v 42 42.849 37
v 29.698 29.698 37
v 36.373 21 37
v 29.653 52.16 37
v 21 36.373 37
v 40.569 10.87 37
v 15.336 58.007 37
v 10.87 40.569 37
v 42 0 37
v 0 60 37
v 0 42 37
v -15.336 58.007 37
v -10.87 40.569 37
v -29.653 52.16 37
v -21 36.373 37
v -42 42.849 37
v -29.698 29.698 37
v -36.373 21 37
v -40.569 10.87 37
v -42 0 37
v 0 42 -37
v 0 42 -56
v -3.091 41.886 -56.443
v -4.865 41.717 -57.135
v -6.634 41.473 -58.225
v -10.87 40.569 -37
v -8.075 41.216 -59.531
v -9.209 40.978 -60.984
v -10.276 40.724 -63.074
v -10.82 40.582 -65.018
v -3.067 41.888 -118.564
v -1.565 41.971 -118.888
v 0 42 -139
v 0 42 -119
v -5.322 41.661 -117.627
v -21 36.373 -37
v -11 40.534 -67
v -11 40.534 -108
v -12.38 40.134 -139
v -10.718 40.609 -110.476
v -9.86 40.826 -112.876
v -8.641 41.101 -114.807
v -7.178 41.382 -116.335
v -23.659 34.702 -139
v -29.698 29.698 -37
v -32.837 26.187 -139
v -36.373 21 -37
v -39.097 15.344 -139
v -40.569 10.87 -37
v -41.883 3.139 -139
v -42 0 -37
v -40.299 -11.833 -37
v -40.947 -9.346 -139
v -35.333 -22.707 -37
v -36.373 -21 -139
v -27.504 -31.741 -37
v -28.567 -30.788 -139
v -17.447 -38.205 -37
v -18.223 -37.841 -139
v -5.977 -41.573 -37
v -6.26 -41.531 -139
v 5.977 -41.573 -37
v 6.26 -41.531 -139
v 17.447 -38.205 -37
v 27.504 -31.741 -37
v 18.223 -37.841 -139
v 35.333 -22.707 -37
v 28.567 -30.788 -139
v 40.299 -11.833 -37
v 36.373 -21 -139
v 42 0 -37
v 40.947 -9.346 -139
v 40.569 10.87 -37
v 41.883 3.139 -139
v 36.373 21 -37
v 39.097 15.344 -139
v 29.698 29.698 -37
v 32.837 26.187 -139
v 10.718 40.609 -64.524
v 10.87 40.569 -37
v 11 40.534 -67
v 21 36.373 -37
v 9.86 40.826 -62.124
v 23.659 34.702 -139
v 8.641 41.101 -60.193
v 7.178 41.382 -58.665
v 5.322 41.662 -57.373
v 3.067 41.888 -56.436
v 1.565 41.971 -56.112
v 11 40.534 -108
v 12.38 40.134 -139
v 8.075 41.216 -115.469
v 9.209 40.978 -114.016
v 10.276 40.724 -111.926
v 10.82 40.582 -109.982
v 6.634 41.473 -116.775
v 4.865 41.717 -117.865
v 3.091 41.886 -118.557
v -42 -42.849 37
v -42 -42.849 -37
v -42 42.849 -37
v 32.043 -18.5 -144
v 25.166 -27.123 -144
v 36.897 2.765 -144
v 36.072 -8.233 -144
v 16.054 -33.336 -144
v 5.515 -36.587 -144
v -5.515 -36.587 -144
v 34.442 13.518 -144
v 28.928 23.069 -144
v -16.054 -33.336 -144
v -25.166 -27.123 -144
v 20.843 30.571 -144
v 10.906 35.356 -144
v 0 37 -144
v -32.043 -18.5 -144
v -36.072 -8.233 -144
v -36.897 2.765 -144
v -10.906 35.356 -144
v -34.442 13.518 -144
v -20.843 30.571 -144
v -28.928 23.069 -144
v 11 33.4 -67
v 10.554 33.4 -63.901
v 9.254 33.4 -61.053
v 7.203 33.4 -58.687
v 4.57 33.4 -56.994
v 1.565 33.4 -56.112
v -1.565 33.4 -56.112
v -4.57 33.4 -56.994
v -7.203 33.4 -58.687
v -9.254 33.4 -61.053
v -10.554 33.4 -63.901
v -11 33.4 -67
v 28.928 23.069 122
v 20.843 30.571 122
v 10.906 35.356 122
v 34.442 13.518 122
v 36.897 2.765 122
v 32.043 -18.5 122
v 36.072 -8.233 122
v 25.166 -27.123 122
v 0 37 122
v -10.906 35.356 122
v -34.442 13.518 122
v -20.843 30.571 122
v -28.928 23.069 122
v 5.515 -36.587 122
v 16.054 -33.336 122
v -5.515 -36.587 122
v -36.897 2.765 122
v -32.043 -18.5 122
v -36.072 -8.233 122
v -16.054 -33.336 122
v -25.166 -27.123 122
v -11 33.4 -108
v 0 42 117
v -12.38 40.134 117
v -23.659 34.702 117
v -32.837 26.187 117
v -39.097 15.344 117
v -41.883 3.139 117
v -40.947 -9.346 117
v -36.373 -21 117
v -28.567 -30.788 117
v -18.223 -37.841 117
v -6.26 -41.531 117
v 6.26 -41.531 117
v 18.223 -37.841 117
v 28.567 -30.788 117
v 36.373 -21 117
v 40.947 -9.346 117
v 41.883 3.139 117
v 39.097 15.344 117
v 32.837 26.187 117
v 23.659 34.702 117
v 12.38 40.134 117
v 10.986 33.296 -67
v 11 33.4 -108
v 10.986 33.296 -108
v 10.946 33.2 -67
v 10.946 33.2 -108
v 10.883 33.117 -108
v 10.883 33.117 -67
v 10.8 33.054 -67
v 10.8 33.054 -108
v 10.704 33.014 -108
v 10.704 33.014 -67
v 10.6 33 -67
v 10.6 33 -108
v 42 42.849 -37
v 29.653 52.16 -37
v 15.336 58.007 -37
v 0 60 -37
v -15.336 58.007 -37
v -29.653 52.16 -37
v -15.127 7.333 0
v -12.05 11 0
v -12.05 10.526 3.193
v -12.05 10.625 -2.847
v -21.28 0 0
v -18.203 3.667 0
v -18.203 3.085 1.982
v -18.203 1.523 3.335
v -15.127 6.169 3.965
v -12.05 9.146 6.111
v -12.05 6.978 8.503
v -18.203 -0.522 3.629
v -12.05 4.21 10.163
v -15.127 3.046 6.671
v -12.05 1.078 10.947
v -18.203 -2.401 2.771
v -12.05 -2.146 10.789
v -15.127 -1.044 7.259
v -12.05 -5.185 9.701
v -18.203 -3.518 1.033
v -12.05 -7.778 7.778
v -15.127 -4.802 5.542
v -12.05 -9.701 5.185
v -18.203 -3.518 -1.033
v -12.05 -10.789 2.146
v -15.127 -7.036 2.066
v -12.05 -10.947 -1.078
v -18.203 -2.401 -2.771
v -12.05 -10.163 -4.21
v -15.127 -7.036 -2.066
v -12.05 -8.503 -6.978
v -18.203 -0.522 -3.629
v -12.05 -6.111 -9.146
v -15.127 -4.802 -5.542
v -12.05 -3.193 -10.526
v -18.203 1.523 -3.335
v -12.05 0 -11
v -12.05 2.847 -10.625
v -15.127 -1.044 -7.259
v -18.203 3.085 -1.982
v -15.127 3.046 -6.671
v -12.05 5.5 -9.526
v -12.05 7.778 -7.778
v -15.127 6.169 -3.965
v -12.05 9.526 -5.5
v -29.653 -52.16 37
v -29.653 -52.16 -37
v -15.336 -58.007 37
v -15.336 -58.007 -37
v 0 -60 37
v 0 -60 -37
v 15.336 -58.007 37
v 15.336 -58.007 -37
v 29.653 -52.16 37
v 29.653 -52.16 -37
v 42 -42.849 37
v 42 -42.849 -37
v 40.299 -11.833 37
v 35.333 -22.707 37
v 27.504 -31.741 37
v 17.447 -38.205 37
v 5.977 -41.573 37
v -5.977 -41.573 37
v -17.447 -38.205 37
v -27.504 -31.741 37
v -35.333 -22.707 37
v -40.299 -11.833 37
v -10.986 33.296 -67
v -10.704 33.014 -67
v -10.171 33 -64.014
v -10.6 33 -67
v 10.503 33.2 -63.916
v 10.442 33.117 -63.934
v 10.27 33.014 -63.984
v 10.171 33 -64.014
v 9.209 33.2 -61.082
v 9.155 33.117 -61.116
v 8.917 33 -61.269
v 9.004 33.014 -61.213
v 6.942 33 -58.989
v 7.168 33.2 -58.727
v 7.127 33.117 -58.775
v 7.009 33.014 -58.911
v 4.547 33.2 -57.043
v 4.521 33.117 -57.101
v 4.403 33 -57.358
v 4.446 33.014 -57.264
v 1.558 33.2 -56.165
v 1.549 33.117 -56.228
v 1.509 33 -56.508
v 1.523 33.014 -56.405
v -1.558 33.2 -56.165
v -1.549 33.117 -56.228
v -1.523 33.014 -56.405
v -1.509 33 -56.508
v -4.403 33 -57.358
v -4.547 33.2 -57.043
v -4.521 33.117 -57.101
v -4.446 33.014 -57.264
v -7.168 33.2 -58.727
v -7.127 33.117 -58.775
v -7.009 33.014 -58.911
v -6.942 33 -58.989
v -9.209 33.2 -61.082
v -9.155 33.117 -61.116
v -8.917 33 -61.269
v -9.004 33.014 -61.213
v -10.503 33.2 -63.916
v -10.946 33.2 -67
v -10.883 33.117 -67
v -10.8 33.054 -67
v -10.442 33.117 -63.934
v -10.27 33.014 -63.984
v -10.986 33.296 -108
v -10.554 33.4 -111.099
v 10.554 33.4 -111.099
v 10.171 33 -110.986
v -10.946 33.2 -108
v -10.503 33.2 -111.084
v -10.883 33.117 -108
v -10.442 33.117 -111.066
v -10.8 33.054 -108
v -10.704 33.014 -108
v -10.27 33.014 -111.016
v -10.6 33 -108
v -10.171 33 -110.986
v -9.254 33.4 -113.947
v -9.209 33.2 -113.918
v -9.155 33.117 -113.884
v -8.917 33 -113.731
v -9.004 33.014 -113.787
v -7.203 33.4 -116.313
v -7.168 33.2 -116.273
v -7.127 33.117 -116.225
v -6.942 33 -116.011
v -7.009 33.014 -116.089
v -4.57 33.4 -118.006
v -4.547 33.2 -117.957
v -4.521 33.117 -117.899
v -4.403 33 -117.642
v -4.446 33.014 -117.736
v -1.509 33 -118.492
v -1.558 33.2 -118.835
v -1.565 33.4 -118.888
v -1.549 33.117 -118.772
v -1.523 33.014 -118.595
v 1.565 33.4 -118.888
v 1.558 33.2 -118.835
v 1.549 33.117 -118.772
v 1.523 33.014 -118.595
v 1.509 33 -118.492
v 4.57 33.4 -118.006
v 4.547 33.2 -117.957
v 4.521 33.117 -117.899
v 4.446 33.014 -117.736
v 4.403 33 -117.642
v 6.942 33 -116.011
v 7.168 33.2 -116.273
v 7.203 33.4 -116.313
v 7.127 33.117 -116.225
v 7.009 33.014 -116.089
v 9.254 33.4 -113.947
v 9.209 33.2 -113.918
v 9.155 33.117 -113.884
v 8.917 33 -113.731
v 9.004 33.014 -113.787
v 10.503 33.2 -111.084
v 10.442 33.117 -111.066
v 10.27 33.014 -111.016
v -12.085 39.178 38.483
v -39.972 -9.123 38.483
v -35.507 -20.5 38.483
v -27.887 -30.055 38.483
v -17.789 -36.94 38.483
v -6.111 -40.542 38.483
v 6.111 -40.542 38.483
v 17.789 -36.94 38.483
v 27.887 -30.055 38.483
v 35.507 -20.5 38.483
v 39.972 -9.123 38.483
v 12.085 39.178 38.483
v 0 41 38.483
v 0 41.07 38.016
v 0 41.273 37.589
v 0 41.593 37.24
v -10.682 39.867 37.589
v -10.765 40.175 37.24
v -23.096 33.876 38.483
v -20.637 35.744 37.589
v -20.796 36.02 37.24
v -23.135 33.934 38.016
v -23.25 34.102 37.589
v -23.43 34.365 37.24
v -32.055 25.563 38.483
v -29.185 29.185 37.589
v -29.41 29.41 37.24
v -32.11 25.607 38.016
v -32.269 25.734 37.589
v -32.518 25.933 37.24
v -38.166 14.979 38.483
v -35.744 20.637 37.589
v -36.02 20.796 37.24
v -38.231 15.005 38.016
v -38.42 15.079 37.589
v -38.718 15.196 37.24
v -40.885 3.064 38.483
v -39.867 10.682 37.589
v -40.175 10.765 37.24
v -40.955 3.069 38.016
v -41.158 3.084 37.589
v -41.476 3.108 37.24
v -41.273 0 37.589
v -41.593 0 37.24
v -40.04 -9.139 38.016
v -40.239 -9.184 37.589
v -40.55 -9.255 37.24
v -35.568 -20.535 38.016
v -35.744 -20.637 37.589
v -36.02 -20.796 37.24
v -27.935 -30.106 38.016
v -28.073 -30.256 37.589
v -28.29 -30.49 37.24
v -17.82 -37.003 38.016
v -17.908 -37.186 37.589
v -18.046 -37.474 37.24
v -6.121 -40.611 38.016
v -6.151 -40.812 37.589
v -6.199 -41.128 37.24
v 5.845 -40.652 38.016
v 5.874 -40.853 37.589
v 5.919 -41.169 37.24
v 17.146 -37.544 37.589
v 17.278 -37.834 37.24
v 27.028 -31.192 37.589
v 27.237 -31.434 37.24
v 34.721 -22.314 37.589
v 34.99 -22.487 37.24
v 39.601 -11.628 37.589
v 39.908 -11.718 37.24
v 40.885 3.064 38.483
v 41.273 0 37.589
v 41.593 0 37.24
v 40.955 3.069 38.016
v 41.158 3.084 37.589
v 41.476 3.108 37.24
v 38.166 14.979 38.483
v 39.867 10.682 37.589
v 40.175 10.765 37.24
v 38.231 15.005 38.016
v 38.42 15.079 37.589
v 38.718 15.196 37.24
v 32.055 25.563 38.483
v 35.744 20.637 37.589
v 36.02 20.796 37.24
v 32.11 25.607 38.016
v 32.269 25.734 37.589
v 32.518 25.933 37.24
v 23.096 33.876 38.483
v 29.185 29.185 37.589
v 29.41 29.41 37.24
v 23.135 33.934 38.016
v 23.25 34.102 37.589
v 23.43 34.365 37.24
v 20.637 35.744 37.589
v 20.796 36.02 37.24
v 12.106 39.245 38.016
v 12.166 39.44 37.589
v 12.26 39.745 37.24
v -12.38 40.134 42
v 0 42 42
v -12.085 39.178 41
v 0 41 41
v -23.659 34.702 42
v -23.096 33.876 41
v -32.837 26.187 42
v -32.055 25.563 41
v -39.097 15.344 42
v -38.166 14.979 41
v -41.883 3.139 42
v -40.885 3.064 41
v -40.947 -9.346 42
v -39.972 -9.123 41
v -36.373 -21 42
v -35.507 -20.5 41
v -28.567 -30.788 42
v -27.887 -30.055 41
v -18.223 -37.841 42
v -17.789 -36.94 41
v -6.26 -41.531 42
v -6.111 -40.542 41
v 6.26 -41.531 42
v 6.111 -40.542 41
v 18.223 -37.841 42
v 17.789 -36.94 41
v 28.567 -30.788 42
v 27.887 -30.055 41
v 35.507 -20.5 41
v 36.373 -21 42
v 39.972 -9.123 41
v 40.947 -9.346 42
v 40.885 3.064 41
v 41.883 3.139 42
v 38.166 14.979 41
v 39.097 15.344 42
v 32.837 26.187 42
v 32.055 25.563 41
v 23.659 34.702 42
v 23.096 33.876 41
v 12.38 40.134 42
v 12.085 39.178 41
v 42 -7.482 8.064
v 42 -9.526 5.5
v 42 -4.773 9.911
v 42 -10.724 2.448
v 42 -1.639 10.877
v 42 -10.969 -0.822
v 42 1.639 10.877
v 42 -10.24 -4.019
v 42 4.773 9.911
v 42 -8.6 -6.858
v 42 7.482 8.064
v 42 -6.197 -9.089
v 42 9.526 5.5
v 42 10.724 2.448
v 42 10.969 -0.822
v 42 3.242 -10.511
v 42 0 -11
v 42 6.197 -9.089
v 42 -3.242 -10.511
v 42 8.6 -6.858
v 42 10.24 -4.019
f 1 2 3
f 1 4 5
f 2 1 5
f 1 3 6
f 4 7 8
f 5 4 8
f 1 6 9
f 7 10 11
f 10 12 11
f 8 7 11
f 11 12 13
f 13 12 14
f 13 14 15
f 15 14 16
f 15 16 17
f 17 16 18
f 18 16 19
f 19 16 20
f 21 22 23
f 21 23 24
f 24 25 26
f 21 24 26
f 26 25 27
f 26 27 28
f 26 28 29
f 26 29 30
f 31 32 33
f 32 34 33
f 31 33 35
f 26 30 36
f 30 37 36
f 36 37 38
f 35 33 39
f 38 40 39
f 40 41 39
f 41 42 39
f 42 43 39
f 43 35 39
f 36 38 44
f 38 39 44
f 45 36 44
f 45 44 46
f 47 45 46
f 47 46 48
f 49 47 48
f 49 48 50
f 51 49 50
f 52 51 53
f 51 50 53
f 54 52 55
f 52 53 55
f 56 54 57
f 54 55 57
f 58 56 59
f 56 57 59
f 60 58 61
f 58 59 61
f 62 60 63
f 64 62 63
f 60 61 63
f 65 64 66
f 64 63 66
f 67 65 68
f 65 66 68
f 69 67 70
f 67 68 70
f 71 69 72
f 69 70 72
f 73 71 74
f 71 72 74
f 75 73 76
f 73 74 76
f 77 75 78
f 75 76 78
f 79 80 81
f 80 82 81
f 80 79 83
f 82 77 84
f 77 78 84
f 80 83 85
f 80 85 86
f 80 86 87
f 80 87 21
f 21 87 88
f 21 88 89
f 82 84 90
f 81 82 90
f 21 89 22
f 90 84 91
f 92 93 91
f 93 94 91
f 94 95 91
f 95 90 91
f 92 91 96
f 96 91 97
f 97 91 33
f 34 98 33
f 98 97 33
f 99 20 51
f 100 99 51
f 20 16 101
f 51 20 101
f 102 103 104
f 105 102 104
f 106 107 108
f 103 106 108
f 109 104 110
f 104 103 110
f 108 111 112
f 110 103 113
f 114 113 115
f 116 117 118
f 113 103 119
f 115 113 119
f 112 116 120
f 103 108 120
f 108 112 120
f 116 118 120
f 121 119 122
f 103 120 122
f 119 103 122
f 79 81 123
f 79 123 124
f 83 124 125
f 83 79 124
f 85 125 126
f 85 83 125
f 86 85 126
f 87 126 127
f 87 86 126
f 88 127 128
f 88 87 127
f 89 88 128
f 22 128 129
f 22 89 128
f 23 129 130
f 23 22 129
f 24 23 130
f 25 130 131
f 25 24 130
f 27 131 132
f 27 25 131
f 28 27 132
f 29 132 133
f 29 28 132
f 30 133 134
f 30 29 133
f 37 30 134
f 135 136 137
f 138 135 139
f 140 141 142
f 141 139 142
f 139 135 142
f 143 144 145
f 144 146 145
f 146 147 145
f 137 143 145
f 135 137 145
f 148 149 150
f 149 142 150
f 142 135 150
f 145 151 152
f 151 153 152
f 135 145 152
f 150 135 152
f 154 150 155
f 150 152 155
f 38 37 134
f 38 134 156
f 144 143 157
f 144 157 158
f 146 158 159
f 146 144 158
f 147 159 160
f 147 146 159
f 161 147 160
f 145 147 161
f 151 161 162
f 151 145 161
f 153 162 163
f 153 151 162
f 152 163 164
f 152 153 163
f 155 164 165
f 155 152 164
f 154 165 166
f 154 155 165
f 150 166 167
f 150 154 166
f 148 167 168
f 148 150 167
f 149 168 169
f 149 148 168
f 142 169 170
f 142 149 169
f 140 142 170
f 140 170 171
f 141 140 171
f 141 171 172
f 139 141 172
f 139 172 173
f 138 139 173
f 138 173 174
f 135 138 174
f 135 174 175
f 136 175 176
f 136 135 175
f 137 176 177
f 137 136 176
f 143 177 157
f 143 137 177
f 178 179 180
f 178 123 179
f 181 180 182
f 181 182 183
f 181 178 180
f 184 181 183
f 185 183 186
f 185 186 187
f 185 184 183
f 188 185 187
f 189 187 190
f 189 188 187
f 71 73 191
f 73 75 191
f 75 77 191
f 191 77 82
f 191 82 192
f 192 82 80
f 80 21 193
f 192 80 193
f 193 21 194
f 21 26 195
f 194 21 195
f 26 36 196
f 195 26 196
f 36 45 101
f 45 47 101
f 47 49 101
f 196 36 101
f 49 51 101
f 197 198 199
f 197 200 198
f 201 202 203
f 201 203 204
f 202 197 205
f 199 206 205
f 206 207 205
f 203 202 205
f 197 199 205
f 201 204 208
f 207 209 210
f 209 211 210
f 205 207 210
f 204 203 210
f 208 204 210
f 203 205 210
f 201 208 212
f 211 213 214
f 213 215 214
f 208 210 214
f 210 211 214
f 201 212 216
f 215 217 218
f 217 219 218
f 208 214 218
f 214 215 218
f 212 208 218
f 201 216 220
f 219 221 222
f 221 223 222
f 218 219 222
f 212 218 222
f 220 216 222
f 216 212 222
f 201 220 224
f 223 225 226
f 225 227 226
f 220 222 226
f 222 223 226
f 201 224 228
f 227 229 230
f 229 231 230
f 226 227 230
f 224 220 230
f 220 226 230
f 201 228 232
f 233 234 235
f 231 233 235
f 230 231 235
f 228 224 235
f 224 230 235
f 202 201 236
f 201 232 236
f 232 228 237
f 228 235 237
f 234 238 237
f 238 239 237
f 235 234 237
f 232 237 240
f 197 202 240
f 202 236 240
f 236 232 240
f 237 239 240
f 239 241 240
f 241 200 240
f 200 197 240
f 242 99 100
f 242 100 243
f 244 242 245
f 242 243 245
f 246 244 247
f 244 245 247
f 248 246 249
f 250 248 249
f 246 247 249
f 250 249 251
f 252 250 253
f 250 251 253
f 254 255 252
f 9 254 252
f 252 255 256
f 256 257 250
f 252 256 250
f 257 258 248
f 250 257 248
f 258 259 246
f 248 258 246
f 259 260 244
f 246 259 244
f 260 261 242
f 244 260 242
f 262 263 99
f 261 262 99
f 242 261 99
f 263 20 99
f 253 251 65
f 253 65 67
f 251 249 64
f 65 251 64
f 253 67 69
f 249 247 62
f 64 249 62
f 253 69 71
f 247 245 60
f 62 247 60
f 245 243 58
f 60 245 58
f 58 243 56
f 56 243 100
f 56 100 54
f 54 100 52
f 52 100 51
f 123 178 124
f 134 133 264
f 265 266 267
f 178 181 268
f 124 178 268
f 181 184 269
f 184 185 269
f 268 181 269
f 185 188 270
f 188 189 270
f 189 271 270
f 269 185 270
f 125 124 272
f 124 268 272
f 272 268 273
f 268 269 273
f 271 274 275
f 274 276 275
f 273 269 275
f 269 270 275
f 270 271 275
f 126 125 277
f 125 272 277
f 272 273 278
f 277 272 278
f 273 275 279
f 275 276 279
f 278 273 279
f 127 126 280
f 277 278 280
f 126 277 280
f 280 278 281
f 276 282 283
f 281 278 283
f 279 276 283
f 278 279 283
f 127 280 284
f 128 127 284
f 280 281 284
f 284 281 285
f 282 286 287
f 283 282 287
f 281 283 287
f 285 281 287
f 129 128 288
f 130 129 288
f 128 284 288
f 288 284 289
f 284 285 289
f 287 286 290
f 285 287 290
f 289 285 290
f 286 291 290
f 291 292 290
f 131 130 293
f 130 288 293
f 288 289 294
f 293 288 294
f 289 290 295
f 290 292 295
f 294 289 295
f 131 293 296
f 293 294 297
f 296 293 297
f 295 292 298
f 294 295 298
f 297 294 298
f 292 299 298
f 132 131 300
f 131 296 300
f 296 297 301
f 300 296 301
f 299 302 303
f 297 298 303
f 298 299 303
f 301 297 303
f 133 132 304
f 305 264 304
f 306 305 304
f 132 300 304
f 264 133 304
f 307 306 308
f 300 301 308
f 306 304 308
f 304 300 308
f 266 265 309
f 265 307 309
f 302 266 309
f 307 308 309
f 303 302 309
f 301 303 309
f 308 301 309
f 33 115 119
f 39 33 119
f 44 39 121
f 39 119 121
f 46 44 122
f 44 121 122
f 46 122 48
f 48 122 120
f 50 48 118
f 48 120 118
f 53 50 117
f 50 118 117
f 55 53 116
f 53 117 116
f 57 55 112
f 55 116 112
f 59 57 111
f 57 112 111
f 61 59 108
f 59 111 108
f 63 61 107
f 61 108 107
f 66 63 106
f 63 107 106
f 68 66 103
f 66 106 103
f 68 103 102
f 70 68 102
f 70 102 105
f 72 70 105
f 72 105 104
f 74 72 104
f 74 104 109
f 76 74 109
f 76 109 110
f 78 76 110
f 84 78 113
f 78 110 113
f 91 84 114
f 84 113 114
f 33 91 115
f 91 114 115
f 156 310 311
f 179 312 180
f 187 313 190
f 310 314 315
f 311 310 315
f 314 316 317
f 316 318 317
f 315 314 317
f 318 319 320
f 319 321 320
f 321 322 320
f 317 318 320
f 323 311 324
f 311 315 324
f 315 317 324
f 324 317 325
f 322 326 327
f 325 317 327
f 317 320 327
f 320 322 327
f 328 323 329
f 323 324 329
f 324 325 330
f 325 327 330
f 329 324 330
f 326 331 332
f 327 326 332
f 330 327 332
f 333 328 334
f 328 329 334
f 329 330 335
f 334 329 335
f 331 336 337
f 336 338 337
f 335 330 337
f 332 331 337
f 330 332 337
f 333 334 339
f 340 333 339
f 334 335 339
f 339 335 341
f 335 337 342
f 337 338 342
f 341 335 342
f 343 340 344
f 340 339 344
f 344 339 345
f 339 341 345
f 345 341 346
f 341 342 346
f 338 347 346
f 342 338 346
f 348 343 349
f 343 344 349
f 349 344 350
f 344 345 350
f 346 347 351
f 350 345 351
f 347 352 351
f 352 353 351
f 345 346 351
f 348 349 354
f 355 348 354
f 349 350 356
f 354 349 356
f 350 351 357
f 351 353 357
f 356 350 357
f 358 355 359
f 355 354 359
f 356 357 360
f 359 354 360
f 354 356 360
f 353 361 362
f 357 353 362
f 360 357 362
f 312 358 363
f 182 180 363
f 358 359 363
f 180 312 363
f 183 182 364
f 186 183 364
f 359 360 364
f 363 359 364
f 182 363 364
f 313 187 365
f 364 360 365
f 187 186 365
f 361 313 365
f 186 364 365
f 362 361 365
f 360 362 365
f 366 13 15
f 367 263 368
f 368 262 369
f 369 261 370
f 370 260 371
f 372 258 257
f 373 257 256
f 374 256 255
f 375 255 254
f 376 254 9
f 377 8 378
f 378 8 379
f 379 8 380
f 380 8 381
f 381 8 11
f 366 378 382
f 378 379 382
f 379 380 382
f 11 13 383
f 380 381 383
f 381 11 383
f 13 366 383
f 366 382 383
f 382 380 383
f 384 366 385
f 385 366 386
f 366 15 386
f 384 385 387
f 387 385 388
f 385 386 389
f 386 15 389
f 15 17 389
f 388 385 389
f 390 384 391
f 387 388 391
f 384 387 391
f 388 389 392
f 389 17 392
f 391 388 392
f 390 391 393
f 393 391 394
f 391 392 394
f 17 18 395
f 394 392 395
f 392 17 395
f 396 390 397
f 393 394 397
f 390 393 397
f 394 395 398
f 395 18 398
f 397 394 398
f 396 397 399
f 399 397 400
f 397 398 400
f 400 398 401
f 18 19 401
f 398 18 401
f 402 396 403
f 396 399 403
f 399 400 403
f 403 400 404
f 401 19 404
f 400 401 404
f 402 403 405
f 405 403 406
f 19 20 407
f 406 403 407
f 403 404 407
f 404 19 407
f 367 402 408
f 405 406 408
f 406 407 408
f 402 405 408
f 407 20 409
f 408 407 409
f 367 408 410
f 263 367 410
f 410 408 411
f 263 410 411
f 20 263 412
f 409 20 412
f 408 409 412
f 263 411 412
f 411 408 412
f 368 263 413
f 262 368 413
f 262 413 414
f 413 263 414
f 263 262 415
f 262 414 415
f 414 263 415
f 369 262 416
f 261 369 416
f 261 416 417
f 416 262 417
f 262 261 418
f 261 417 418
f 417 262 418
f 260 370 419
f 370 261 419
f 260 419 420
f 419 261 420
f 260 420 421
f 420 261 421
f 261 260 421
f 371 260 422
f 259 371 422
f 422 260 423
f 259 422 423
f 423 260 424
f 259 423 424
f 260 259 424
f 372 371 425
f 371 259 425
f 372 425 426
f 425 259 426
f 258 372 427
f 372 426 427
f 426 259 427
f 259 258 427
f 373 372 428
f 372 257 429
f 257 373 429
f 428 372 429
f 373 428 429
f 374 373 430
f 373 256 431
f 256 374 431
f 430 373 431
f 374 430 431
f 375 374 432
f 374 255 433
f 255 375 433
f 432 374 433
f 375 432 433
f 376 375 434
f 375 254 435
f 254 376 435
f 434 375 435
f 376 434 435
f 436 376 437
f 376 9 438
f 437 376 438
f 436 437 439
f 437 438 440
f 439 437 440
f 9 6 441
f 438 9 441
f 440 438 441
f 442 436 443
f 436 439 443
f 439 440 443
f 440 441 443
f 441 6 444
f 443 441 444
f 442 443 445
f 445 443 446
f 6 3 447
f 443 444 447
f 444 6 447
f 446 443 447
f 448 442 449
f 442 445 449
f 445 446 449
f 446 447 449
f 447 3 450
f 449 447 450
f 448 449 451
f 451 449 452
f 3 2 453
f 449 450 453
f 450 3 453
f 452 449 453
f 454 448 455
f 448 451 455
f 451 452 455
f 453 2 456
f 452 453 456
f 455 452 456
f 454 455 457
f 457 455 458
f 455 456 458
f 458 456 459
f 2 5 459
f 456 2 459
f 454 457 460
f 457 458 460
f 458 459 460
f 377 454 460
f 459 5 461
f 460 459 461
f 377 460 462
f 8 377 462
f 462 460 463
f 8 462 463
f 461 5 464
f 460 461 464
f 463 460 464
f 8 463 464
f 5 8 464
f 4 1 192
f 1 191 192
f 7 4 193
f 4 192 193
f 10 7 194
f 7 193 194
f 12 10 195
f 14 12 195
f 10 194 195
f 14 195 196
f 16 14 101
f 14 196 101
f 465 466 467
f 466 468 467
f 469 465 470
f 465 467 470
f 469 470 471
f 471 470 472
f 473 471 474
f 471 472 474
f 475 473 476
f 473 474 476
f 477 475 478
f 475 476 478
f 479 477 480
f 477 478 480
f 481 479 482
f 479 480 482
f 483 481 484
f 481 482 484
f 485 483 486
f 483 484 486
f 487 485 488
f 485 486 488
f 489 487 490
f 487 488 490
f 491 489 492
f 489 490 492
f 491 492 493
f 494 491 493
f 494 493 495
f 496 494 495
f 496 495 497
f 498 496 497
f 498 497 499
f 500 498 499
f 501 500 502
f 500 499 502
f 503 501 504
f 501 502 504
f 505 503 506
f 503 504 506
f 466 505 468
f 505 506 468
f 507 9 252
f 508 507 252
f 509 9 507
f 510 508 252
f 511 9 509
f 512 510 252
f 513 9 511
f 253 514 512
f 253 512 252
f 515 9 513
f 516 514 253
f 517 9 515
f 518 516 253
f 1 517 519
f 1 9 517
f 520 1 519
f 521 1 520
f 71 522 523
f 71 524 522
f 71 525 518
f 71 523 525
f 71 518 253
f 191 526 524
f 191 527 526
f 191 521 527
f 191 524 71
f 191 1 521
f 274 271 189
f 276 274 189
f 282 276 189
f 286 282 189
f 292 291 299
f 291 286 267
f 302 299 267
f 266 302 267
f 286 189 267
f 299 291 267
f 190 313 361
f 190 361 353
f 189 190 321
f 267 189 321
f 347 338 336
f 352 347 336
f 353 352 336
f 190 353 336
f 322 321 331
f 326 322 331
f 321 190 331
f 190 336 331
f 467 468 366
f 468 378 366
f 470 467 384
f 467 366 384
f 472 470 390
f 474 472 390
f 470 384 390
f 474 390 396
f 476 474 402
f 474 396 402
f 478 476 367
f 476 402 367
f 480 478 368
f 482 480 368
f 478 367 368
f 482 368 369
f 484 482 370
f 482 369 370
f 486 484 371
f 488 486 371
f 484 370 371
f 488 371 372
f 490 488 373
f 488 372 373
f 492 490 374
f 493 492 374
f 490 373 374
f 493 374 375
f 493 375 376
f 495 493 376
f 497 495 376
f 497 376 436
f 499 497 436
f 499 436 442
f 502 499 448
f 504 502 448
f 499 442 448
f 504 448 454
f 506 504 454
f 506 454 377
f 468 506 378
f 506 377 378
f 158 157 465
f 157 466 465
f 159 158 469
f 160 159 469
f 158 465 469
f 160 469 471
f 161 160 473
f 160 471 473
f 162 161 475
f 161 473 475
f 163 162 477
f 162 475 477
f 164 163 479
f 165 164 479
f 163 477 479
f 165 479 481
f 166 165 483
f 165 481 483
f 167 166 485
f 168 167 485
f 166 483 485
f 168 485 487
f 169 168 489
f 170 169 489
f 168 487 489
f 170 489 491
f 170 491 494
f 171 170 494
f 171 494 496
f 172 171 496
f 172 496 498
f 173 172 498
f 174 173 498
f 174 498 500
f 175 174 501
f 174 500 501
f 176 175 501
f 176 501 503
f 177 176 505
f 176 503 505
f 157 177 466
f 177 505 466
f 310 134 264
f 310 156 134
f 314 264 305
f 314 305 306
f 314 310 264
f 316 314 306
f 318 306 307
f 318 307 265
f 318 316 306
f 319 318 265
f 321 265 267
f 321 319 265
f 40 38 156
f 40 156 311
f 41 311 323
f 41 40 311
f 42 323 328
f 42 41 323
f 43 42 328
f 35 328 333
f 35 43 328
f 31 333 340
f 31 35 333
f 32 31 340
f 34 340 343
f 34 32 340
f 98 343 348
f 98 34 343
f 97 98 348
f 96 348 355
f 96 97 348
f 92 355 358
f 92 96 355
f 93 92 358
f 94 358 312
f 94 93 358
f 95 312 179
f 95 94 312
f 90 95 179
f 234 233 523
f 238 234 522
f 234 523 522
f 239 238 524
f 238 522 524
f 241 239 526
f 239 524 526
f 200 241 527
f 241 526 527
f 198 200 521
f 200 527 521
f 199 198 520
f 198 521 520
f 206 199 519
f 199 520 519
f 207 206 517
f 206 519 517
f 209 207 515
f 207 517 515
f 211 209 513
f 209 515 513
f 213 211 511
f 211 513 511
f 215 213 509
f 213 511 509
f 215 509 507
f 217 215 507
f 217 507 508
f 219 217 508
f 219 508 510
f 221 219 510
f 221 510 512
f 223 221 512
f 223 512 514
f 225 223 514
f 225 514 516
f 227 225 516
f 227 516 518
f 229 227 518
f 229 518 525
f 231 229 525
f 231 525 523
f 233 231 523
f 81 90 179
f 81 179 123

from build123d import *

# Parameters (mm, degrees)
CUT_EXTRUDE_1_DEPTH = 9
FILLET_1_R          = 0.4
CHAMFER_1_SIZE      = 5
CHAMFER_2_SIZE      = 5
SKETCH_5_W          = 18
SKETCH_5_H          = 74
CUT_EXTRUDE_2_DEPTH = 120
SKETCH_6_R          = 11
CUT_EXTRUDE_3_DEPTH = 54.05


with BuildPart() as part:
    # Эскиз1 → Повернуть1 (revolve)
    with BuildSketch(Plane(origin=(0, 0, 0), x_dir=(0, 0, -1), z_dir=(1, 0, 0))):
        Polygon((144, 0), (-122, 0), (-122, 42), (-37, 42), (-37, 60), (37, 60), (37, 42), (144, 42), align=None)
    revolve(axis=Axis((0, 0, 0), (0, 0, 1)))

    # Эскиз2 → Вырез-Вытянуть1 (cut)
    with BuildSketch(Plane(origin=(0, 42, 0), x_dir=(1, 0, 0), z_dir=(0, 1, 0))):
        with BuildLine():
            Line((-11, 67), (-11, 108))
            ThreePointArc((-11, 108), (0, 119), (11, 108))
            Line((11, 108), (11, 67))
            ThreePointArc((11, 67), (0, 56), (-11, 67))
        make_face()
    extrude(amount=-CUT_EXTRUDE_1_DEPTH, mode=Mode.SUBTRACT)

    # Скругление1
    fillet_1_edges = [part.edges().sort_by_distance(p)[0] for p in [
        (0, 33, -56),
        (-11, 33, -87.5),
        (0, 33, -119),
        (11, 33, -87.5),
    ]]
    fillet(fillet_1_edges, radius=FILLET_1_R)

    # Фаска1
    chamfer_1_edges = [part.edges().sort_by_distance(p)[0] for p in [
        (0, -42, -144),
    ]]
    chamfer(chamfer_1_edges, length=CHAMFER_1_SIZE)

    # Фаска2
    chamfer_2_edges = [part.edges().sort_by_distance(p)[0] for p in [
        (0, -42, 122),
    ]]
    chamfer(chamfer_2_edges, length=CHAMFER_2_SIZE)

    # Эскиз3 → Вырез-Повернуть1 (revolve, cut)
    with BuildSketch(Plane(origin=(0, 0, 0), x_dir=(0, 0, -1), z_dir=(1, 0, 0))):
        with BuildLine():
            Line((-37, 42), (-42, 42))
            Line((-42, 42), (-41, 41))
            Line((-41, 41), (-38.483239697, 41))
            ThreePointArc((-38.483239697, 41), (-37.588812506, 41.273350084), (-37, 42))
        make_face()
    revolve(axis=Axis((0, 0, 0), (0, 0, 1)), mode=Mode.SUBTRACT)

    # Эскиз5 → Вырез-Вытянуть2 (cut)
    with BuildSketch(Plane(origin=(0, 60, 0), x_dir=(1, 0, 0), z_dir=(0, 1, 0))):
        with Locations((-51, 0)):
            Rectangle(SKETCH_5_W, SKETCH_5_H)
        with Locations((51, 0)):
            Rectangle(SKETCH_5_W, SKETCH_5_H)
    extrude(amount=-CUT_EXTRUDE_2_DEPTH, mode=Mode.SUBTRACT)

    # Эскиз6 → Вырез-Вытянуть3 (cut)
    with BuildSketch(Plane(origin=(42, 0, 0), x_dir=(0, 0, -1), z_dir=(1, 0, 0))):
        Circle(SKETCH_6_R)
    extrude(amount=-CUT_EXTRUDE_3_DEPTH, mode=Mode.SUBTRACT)

    # Эскиз7 → Вырез-Повернуть6 (revolve, cut)
    with BuildSketch(Plane.XY):
        Polygon((-12.05, 11), (-12.05, 0), (-21.280095943, 0), align=None)
    revolve(axis=Axis((-21, 0, 0), (1, 0, 0)), mode=Mode.SUBTRACT)


solid = part.part
